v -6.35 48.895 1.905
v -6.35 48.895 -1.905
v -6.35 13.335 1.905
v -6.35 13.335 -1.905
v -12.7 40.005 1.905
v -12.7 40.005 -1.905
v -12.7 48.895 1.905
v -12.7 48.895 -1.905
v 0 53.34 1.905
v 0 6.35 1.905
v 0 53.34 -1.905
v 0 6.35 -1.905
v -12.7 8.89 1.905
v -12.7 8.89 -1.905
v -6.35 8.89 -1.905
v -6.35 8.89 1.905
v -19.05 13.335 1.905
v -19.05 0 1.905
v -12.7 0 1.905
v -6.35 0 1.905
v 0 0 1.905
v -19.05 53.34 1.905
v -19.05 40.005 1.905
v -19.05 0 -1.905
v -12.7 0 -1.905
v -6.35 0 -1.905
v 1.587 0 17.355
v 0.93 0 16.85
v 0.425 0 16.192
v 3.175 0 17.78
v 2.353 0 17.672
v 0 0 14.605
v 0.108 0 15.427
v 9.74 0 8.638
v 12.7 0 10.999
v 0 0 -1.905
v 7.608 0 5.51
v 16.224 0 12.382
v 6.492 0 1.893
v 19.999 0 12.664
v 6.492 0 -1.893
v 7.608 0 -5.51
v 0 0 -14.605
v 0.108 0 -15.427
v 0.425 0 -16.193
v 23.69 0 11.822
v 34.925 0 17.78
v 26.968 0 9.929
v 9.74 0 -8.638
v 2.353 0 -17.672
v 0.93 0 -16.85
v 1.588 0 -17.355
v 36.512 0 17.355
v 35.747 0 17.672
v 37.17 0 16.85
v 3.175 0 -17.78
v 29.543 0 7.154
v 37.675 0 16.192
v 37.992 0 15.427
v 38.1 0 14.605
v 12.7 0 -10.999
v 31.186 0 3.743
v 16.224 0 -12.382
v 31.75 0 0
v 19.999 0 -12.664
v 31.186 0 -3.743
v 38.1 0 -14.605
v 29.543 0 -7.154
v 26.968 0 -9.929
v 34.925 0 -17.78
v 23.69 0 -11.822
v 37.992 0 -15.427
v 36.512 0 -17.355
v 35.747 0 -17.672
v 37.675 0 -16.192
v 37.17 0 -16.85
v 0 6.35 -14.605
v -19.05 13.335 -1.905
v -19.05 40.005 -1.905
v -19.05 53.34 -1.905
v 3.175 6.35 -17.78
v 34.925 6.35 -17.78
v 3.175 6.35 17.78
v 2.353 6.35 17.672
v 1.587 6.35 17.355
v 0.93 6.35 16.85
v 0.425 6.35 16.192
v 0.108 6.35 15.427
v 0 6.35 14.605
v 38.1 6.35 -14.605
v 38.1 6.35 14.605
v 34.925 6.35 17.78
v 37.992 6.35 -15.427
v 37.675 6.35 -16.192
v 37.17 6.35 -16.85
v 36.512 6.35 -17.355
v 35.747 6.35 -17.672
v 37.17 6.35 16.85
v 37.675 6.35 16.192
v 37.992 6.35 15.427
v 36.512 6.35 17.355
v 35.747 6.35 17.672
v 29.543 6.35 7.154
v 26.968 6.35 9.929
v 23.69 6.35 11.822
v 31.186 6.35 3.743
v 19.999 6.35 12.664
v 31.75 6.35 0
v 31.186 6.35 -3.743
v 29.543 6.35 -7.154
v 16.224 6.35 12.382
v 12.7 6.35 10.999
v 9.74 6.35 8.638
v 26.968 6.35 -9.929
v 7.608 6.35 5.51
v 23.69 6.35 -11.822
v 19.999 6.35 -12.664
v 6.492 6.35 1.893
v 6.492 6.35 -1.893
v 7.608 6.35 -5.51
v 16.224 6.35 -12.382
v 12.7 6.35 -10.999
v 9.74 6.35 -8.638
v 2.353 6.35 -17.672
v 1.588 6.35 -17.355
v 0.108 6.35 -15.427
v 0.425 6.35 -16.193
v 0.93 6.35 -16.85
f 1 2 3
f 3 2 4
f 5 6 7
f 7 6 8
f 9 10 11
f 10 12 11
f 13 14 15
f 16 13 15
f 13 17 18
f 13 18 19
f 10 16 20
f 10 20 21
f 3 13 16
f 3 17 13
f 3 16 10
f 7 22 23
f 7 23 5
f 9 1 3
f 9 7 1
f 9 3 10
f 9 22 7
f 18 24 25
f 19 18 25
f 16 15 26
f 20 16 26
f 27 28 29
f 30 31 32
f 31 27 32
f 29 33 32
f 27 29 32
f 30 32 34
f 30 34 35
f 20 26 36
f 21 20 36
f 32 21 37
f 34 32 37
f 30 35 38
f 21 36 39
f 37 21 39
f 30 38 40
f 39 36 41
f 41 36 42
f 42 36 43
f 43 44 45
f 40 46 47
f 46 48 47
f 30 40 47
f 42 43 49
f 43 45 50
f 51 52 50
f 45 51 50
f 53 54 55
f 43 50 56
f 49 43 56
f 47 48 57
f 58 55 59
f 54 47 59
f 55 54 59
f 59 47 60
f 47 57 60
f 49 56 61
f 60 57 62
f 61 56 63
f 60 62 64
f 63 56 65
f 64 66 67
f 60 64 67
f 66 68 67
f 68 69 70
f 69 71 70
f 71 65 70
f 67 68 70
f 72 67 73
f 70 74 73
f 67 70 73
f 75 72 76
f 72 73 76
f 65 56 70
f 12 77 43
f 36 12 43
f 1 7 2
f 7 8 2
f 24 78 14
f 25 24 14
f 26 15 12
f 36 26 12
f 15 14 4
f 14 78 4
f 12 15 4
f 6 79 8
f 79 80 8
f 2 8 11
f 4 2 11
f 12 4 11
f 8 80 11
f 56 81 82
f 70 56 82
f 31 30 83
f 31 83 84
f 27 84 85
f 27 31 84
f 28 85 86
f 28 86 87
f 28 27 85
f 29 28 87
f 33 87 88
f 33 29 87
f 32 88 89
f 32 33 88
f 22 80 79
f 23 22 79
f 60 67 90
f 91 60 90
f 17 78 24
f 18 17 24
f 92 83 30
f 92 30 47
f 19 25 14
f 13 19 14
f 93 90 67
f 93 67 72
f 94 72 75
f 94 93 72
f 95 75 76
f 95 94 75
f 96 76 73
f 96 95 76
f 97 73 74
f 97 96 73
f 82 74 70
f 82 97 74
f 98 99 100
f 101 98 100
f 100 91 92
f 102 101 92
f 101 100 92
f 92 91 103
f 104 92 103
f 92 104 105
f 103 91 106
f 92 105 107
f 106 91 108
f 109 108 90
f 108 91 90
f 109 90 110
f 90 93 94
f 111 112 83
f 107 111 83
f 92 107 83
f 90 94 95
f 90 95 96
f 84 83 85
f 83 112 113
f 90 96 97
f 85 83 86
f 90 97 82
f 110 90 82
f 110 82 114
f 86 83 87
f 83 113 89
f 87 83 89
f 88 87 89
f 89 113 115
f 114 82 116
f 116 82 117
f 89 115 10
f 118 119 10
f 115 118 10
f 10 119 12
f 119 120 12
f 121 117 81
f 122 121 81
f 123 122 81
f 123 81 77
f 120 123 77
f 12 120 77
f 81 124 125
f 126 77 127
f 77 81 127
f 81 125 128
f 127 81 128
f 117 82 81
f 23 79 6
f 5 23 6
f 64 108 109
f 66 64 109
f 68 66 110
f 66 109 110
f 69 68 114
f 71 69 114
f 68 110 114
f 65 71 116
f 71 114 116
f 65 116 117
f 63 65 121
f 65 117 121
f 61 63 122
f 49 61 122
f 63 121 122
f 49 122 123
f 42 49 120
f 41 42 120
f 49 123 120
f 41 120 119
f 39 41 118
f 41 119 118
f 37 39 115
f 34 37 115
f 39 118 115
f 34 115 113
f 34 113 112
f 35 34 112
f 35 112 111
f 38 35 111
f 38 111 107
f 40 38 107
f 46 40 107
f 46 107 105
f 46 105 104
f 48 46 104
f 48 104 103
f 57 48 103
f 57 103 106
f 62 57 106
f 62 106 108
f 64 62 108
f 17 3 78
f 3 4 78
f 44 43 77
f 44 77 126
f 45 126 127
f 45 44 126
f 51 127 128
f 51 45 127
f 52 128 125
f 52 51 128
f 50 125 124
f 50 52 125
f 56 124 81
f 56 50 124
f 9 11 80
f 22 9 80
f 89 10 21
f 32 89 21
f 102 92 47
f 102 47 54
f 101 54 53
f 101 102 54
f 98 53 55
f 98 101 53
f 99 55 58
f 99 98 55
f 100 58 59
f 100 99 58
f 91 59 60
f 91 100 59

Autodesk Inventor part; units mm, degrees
ref_plane "YZ Plane" through (0, 0, 0) normal (1, 0, 0) x (0, 1, 0)
ref_plane "XZ Plane" through (0, 0, 0) normal (0, 1, 0) x (-1, 0, 0)
ref_plane "XY Plane" through (0, 0, 0) normal (0, 0, 1) x (1, 0, 0)
sketch "Sketch1" plane through (0, 0, 0) normal (0, 0, 1) x (1, 0, 0)
  line L0 (0, 6.35) -> (0, 53.34)
  line L1 (0, 53.34) -> (-19.05, 53.34)
  line L2 (-19.05, 53.34) -> (-19.05, 55.245)
  line L3 (-12.7, 48.895) -> (-6.35, 48.895)
  line L4 (-6.35, 48.895) -> (-6.35, 13.335)
  line L5 (-6.35, 13.335) -> (-19.05, 13.335)
  line L6 (-19.05, 13.335) -> (-19.05, 12.7)
  line L7 (-12.7, 8.89) -> (-6.35, 8.89)
  line L8 (-6.35, 8.89) -> (-6.35, 0)
  line L9 (-6.35, 0) -> (0, 0)
  line L10 (-19.05, 55.245) -> (-19.05, 40.005)
  line L11 (-19.05, 40.005) -> (-12.7, 40.005)
  line L12 (-12.7, 40.005) -> (-12.7, 48.895)
  line L13 (-19.05, 12.7) -> (-19.05, 0)
  line L14 (-19.05, 0) -> (-12.7, 0)
  line L15 (-12.7, 0) -> (-12.7, 8.89)
  line L16 (0, 0) -> (0, 6.35)
  point P0 (-19.05, 53.34)
  point P1 (-19.05, 11.43)
  dimension "d1" = 35.56
  dimension "d2" = 4.445
  dimension "d3" = 4.445
  dimension "d4" = 6.35
  dimension "d6" = 6.35
  dimension "d7" = 6.35
  dimension "d13" = 13.335
  dimension "d14" = 13.335
extrude "Extrusion1" add sketch "Sketch1" along normal mid plane 3.81
sketch "Sketch2" plane through (0, 0, 0) normal (0, 0, 1) x (1, 0, 0)
  line L0 (0, 53.34) -> (0, 0) projected
  line L1 (0, 0) -> (38.1, 0)
  line L2 (38.1, 0) -> (38.1, 6.35)
  line L3 (38.1, 6.35) -> (0, 6.35)
  dimension "d15" = 38.1
  dimension "d16" = 6.35
extrude "Extrusion2" add sketch "Sketch2" along normal mid plane 35.56
sketch "Sketch3" plane through (0, 6.35, 17.78) normal (0, 1, 0) x (1, 0, 0)
  circle A0 centre (19.05, 17.78) radius 12.7
  point P0 (0, 17.78)
  dimension "d19" = 25.4
extrude "Extrusion3" cut sketch "Sketch3" against normal through all
fillet "Fillet1" radius 3.175 4 edges at (38.1, 3.175, 17.78) (38.1, 3.175, -17.78) (0, 3.175, -17.78) (0, 3.175, 17.78)
equation "\"d11\" = width"
equation "\"width\" = 3.81"
properties part number "round_1_0_inchHoleV01"
